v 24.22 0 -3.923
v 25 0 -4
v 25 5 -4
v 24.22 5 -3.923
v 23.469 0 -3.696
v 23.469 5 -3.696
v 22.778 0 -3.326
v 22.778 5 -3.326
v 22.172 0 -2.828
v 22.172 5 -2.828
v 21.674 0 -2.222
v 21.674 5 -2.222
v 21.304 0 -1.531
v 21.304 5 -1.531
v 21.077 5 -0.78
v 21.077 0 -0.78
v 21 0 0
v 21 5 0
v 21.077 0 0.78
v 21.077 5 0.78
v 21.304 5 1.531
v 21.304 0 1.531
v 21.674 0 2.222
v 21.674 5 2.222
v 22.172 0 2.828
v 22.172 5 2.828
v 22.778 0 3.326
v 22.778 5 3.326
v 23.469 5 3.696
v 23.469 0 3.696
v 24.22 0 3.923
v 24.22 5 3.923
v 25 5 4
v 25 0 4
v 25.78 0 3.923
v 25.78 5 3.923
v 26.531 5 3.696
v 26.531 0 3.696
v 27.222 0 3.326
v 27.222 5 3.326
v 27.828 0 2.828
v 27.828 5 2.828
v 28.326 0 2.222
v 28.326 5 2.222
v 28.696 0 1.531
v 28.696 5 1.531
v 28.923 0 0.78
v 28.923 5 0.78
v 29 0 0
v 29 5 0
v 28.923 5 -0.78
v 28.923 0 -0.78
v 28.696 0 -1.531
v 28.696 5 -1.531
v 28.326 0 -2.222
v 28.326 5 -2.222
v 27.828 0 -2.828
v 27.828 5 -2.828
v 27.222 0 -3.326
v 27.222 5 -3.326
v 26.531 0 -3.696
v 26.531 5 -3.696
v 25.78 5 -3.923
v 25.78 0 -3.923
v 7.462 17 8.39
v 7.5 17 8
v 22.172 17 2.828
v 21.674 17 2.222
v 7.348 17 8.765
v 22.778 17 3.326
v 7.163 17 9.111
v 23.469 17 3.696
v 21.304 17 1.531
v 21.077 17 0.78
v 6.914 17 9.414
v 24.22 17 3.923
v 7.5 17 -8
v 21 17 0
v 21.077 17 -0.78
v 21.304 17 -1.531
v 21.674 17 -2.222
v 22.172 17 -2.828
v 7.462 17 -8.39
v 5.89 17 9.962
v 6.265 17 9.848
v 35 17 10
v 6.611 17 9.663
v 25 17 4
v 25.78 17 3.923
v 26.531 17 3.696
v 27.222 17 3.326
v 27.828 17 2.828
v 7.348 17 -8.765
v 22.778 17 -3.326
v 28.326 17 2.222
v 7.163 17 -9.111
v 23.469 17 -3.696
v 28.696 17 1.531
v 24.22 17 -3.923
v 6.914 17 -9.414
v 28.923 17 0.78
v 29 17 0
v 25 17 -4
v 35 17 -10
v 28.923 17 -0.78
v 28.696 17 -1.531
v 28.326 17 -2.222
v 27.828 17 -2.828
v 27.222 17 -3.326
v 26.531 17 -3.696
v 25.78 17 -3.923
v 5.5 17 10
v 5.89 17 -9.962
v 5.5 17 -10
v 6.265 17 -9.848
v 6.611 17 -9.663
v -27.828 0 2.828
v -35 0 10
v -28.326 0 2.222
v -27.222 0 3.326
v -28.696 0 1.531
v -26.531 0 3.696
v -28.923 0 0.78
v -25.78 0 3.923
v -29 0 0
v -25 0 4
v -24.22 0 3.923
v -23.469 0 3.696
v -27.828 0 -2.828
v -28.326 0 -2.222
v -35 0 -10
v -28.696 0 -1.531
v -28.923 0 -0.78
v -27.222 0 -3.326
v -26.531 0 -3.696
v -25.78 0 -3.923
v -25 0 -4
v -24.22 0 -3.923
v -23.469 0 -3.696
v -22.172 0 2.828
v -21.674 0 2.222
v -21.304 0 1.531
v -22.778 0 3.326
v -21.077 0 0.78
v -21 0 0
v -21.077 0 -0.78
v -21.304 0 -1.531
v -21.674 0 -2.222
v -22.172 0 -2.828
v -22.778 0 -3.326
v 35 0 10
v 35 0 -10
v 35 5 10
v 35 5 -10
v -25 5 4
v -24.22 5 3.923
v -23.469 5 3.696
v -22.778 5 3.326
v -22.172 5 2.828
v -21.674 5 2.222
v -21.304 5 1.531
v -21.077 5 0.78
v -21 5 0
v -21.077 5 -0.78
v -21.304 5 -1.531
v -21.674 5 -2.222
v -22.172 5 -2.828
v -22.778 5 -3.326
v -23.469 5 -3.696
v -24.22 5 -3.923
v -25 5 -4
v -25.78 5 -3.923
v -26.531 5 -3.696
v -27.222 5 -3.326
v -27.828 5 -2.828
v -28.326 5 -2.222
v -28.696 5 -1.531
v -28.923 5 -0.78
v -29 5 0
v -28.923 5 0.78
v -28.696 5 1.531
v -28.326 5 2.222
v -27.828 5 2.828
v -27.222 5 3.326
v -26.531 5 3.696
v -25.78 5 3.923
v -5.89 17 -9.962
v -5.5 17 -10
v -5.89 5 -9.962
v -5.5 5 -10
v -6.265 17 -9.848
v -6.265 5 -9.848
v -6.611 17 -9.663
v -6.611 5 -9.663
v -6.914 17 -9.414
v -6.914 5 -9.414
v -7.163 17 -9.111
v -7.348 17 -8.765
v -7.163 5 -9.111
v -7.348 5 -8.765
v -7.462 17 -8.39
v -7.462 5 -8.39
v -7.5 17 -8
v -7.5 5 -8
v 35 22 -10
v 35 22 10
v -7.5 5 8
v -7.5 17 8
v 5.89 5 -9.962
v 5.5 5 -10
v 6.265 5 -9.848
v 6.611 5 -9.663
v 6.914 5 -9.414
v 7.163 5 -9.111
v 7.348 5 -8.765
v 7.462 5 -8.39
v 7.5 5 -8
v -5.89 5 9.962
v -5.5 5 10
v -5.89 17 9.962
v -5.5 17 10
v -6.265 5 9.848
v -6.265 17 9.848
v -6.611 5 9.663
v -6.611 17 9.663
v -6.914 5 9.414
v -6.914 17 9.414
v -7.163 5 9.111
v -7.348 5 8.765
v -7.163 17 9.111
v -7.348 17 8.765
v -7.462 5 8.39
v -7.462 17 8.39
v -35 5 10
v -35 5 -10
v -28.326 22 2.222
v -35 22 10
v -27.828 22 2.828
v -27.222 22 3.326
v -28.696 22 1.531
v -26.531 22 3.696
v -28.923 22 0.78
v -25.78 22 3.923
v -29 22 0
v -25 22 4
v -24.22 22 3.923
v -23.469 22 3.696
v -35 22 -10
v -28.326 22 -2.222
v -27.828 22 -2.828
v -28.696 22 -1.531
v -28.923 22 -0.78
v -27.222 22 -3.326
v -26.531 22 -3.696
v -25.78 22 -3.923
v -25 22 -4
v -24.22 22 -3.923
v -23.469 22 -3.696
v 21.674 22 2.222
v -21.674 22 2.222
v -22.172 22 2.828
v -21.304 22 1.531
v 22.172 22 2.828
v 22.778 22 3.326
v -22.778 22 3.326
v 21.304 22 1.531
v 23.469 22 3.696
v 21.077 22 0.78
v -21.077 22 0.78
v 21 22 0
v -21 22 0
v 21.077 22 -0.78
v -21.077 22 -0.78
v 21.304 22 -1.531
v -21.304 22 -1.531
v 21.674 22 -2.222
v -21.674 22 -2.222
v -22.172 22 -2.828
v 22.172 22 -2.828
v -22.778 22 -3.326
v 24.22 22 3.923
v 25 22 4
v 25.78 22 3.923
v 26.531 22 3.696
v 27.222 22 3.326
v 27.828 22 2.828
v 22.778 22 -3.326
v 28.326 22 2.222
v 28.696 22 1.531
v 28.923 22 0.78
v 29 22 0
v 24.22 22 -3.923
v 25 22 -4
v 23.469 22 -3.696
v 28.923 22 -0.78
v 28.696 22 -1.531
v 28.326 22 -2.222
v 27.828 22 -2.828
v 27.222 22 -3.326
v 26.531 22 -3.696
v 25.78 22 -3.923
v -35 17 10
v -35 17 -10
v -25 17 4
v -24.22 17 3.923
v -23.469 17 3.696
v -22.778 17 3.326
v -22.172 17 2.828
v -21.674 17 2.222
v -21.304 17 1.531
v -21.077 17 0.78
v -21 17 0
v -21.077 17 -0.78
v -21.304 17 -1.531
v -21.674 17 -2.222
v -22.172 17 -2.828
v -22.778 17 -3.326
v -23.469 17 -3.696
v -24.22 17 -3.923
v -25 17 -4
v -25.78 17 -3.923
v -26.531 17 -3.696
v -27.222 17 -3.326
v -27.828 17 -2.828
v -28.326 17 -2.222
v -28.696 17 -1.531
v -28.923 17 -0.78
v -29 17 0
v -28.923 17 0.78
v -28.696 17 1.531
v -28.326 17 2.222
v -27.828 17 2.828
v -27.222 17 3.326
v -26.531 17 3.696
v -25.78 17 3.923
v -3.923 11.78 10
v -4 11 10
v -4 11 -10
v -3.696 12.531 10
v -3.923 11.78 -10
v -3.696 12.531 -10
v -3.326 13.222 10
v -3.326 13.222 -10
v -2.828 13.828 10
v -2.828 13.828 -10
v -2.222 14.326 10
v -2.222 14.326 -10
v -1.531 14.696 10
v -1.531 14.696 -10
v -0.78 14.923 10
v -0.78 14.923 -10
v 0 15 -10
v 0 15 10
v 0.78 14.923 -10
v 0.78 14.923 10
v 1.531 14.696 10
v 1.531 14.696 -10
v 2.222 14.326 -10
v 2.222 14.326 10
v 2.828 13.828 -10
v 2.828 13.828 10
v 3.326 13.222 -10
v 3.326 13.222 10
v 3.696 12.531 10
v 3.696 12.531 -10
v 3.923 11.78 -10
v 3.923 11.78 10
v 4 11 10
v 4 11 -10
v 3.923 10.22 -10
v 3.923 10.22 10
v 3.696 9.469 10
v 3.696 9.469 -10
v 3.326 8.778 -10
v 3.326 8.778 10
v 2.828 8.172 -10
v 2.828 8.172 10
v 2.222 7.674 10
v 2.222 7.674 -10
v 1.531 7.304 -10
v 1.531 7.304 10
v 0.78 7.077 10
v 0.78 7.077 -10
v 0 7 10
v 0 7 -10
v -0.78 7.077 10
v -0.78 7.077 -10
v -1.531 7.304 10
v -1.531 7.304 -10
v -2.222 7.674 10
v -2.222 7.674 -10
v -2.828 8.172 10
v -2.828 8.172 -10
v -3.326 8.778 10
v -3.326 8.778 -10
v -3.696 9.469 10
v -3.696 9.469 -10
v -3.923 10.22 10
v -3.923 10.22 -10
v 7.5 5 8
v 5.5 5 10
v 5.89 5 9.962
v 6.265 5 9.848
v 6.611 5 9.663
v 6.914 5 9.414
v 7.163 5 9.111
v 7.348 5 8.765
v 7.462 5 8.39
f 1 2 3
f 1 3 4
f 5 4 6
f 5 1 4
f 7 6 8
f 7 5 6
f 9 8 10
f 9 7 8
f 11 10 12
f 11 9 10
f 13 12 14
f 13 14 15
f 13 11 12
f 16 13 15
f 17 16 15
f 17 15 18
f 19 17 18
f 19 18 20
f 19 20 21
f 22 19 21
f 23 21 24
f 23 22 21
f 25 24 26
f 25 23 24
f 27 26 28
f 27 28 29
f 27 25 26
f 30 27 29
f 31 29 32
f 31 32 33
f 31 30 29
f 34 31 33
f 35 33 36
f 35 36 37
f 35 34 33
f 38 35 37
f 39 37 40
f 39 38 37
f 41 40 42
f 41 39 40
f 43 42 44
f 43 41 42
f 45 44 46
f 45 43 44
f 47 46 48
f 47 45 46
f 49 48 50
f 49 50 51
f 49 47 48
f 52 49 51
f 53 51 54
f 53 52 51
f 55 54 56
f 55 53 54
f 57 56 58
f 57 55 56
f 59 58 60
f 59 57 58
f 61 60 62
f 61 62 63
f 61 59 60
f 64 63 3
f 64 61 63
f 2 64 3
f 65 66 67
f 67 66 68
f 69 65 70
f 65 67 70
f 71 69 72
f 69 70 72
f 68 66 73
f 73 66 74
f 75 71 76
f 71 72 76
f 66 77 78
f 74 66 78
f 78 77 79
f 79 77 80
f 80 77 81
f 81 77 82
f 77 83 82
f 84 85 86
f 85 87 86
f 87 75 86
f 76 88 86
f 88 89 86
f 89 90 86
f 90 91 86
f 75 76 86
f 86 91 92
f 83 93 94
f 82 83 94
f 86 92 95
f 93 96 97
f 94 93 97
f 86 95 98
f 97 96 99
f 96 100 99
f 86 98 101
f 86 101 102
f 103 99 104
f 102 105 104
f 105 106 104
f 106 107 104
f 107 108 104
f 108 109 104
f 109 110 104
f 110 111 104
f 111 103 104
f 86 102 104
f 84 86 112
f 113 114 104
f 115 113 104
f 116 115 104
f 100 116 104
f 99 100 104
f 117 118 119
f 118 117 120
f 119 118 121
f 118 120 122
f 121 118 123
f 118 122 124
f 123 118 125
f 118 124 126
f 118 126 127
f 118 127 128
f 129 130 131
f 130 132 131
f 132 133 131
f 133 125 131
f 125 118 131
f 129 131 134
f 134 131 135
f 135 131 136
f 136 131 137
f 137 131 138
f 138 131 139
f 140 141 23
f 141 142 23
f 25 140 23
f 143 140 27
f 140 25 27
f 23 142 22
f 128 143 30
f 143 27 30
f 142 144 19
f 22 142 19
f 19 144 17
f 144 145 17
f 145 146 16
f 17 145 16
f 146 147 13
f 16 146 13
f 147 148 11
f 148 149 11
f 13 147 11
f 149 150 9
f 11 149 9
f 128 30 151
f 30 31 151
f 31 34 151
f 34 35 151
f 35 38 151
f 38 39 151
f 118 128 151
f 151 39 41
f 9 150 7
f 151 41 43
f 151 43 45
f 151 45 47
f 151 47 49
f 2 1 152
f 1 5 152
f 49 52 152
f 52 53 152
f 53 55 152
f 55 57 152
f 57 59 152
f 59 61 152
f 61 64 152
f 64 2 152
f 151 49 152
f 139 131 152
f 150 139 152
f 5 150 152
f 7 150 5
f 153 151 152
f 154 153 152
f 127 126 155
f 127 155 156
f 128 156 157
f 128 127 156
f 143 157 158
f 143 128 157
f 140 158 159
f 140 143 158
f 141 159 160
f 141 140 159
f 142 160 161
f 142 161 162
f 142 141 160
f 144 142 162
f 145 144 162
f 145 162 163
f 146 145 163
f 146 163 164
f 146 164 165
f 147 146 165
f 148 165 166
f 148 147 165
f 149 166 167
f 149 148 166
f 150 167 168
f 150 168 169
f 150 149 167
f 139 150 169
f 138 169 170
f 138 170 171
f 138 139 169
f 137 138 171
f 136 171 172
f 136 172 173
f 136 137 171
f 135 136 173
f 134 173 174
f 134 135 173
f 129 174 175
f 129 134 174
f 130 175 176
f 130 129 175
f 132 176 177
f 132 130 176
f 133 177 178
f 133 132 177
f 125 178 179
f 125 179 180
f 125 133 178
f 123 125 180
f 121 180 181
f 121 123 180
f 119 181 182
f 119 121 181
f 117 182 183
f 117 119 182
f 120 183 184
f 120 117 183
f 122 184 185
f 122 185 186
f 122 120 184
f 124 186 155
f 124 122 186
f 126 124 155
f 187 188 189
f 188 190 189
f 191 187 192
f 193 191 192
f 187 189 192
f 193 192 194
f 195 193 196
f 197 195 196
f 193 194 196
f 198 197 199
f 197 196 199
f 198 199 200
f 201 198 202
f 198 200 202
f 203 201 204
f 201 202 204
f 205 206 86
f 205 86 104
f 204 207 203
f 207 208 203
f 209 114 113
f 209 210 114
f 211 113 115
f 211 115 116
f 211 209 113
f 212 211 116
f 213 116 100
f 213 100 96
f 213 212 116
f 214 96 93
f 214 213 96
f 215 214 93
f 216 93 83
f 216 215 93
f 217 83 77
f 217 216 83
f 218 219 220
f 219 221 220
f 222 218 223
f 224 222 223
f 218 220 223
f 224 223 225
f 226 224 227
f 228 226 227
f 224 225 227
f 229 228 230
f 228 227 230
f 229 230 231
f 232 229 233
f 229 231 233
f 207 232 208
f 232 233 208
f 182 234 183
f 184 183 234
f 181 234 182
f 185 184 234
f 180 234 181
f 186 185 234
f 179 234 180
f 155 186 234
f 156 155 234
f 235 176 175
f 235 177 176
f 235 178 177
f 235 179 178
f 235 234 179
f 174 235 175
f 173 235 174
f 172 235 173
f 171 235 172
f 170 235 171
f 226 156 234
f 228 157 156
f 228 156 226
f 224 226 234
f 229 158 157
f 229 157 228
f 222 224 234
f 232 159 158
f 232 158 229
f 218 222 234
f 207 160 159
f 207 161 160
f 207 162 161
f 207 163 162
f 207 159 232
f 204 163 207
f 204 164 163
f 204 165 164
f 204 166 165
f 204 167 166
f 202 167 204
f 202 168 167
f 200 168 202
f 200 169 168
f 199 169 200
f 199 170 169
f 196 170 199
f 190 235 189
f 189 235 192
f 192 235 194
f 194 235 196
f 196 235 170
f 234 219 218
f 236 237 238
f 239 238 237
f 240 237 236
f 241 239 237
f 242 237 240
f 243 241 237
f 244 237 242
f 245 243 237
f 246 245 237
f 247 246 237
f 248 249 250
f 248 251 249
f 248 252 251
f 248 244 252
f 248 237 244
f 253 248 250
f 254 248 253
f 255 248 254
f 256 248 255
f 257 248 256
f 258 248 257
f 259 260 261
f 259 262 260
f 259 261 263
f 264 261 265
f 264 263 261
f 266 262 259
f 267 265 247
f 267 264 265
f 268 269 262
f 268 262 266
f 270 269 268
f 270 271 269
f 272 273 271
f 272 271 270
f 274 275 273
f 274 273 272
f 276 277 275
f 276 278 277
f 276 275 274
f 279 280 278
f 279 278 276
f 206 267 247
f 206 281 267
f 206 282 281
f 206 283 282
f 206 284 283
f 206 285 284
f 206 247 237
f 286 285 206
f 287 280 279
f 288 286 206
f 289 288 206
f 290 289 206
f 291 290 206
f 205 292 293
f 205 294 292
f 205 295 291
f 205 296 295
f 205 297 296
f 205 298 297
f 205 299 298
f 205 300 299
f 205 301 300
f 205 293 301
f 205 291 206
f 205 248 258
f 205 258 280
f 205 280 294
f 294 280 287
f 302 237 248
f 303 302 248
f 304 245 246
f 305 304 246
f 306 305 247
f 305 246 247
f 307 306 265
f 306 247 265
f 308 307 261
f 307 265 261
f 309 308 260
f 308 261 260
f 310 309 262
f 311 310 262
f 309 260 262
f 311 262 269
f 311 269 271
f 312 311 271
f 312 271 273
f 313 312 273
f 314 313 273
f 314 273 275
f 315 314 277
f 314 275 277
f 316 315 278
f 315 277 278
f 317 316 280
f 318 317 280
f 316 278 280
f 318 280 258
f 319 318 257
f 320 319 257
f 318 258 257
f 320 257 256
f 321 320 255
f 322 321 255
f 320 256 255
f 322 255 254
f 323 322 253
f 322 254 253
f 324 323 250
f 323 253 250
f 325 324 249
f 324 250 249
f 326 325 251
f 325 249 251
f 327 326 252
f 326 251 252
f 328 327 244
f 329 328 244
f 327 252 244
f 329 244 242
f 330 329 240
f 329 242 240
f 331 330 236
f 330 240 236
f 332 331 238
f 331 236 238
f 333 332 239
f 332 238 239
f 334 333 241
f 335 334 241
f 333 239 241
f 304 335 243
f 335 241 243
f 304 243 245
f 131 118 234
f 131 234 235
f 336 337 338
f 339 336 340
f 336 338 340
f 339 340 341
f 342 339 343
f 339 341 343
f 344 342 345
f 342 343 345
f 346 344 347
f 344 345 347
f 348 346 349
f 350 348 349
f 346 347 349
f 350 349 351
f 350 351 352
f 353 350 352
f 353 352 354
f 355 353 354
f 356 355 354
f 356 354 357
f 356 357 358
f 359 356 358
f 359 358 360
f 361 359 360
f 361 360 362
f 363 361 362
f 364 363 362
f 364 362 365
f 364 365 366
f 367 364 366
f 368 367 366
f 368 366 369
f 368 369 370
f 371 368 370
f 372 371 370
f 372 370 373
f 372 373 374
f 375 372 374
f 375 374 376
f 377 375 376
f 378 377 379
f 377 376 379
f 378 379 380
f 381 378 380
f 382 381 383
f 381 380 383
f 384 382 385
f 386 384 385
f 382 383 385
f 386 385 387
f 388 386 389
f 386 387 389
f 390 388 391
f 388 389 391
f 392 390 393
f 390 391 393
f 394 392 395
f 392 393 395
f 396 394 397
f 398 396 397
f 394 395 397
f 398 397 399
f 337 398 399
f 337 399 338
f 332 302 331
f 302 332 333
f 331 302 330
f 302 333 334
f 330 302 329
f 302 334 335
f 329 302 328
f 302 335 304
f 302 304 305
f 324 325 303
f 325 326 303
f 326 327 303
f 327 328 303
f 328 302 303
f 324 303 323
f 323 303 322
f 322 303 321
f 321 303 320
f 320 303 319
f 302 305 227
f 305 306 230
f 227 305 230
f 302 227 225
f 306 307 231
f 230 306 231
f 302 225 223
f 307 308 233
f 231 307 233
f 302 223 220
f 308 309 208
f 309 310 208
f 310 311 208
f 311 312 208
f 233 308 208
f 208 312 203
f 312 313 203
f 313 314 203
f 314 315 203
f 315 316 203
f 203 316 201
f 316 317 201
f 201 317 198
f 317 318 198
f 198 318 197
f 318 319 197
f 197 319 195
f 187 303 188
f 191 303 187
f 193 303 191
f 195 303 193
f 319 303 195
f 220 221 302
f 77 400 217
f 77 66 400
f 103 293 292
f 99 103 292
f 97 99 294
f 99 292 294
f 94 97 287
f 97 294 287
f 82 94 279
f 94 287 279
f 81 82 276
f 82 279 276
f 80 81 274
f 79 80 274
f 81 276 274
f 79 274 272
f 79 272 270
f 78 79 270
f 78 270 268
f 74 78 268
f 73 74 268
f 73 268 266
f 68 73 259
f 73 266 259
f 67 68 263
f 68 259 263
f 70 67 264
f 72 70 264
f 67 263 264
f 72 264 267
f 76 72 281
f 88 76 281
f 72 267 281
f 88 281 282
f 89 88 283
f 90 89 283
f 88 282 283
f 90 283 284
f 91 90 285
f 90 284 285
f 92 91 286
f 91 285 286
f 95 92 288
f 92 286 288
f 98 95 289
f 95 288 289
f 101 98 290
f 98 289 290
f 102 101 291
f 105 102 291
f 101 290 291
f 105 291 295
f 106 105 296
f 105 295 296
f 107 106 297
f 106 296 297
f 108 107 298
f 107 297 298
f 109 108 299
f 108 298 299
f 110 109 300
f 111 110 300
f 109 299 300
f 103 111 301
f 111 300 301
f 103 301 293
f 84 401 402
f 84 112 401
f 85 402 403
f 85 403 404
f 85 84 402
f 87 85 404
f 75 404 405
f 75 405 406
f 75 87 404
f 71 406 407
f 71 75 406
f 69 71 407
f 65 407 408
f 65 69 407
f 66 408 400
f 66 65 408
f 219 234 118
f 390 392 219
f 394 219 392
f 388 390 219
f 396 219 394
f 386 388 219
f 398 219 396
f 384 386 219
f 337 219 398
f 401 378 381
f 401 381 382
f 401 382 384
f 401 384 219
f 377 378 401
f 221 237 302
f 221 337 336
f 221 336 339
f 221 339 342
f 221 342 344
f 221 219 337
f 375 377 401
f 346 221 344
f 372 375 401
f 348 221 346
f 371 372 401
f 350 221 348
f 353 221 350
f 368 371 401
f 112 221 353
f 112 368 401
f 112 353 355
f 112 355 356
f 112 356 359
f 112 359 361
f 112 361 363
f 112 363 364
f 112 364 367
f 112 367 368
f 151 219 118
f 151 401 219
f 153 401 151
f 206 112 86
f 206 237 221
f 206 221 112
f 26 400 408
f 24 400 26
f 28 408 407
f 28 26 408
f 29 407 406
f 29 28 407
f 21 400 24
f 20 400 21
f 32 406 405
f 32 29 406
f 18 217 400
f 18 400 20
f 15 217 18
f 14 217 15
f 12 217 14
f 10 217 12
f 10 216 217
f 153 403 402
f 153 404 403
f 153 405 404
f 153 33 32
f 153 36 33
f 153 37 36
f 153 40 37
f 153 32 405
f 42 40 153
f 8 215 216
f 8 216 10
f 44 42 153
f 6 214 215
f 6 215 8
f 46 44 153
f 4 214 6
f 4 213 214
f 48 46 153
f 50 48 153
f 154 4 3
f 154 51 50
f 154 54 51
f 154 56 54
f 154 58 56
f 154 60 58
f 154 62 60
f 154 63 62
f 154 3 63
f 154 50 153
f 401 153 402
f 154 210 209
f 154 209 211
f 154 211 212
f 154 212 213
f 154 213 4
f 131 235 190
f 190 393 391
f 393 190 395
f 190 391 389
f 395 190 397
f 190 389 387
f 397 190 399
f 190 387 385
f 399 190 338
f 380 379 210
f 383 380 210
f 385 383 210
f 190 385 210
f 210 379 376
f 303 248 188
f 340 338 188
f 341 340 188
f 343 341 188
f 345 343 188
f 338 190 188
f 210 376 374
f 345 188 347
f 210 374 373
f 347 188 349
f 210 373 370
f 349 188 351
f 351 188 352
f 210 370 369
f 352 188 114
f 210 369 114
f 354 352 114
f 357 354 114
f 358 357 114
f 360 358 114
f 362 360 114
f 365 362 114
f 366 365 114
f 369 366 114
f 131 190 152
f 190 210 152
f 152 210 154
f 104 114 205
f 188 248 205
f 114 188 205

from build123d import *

# Parameters (mm, degrees)
SKETCH1_W           = 70
SKETCH1_H           = 20
SKETCH1_R           = 4
BOSS_EXTRUDE1_DEPTH = 5
SKETCH2_W           = 15
SKETCH2_H           = 20
BOSS_EXTRUDE2_DEPTH = 6
SKETCH3_R           = 4
CUT_EXTRUDE1_DEPTH  = 46.923850013
FILLET1_R           = 2


with BuildPart() as part:
    # Sketch1 → Boss-Extrude1 (new body)
    with BuildSketch(Plane(origin=(0, 0, 0), x_dir=(1, 0, 0), z_dir=(0, 1, 0))):
        Rectangle(SKETCH1_W, SKETCH1_H)
        with Locations(Location((-25, 0, 0), (0, 0, 270))):
            Circle(SKETCH1_R, mode=Mode.SUBTRACT)
        with Locations(Location((25, 0, 0), (0, 0, 90))):
            Circle(SKETCH1_R, mode=Mode.SUBTRACT)
    boss_extrude1 = extrude(amount=BOSS_EXTRUDE1_DEPTH)

    # Sketch2 → Boss-Extrude2 (add)
    with BuildSketch(Plane(origin=(0, 5, 0), x_dir=(1, 0, 0), z_dir=(0, 1, 0))):
        Rectangle(SKETCH2_W, SKETCH2_H)
    boss_extrude2 = extrude(amount=BOSS_EXTRUDE2_DEPTH)

    # Mirror3: Boss-Extrude2 across plane
    add(boss_extrude2.mirror(Plane.ZX.offset(11)))

    # Mirror4: Boss-Extrude1 across plane
    add(boss_extrude1.mirror(Plane.ZX.offset(11)))

    # Sketch3 → Cut-Extrude1 (cut, through all)
    with BuildSketch(Plane(origin=(0, 0, -10), x_dir=(-1, 0, 0), z_dir=(0, 0, -1))):
        with Locations((0, 11)):
            Circle(SKETCH3_R)
    extrude(amount=-CUT_EXTRUDE1_DEPTH, mode=Mode.SUBTRACT)

    # Fillet1
    fillet1_edges = [part.edges().sort_by_distance(p)[0] for p in [
        (7.5, 11, 10),
        (7.5, 11, -10),
        (-7.5, 11, -10),
        (-7.5, 11, 10),
    ]]
    fillet(fillet1_edges, radius=FILLET1_R)


solid = part.part
